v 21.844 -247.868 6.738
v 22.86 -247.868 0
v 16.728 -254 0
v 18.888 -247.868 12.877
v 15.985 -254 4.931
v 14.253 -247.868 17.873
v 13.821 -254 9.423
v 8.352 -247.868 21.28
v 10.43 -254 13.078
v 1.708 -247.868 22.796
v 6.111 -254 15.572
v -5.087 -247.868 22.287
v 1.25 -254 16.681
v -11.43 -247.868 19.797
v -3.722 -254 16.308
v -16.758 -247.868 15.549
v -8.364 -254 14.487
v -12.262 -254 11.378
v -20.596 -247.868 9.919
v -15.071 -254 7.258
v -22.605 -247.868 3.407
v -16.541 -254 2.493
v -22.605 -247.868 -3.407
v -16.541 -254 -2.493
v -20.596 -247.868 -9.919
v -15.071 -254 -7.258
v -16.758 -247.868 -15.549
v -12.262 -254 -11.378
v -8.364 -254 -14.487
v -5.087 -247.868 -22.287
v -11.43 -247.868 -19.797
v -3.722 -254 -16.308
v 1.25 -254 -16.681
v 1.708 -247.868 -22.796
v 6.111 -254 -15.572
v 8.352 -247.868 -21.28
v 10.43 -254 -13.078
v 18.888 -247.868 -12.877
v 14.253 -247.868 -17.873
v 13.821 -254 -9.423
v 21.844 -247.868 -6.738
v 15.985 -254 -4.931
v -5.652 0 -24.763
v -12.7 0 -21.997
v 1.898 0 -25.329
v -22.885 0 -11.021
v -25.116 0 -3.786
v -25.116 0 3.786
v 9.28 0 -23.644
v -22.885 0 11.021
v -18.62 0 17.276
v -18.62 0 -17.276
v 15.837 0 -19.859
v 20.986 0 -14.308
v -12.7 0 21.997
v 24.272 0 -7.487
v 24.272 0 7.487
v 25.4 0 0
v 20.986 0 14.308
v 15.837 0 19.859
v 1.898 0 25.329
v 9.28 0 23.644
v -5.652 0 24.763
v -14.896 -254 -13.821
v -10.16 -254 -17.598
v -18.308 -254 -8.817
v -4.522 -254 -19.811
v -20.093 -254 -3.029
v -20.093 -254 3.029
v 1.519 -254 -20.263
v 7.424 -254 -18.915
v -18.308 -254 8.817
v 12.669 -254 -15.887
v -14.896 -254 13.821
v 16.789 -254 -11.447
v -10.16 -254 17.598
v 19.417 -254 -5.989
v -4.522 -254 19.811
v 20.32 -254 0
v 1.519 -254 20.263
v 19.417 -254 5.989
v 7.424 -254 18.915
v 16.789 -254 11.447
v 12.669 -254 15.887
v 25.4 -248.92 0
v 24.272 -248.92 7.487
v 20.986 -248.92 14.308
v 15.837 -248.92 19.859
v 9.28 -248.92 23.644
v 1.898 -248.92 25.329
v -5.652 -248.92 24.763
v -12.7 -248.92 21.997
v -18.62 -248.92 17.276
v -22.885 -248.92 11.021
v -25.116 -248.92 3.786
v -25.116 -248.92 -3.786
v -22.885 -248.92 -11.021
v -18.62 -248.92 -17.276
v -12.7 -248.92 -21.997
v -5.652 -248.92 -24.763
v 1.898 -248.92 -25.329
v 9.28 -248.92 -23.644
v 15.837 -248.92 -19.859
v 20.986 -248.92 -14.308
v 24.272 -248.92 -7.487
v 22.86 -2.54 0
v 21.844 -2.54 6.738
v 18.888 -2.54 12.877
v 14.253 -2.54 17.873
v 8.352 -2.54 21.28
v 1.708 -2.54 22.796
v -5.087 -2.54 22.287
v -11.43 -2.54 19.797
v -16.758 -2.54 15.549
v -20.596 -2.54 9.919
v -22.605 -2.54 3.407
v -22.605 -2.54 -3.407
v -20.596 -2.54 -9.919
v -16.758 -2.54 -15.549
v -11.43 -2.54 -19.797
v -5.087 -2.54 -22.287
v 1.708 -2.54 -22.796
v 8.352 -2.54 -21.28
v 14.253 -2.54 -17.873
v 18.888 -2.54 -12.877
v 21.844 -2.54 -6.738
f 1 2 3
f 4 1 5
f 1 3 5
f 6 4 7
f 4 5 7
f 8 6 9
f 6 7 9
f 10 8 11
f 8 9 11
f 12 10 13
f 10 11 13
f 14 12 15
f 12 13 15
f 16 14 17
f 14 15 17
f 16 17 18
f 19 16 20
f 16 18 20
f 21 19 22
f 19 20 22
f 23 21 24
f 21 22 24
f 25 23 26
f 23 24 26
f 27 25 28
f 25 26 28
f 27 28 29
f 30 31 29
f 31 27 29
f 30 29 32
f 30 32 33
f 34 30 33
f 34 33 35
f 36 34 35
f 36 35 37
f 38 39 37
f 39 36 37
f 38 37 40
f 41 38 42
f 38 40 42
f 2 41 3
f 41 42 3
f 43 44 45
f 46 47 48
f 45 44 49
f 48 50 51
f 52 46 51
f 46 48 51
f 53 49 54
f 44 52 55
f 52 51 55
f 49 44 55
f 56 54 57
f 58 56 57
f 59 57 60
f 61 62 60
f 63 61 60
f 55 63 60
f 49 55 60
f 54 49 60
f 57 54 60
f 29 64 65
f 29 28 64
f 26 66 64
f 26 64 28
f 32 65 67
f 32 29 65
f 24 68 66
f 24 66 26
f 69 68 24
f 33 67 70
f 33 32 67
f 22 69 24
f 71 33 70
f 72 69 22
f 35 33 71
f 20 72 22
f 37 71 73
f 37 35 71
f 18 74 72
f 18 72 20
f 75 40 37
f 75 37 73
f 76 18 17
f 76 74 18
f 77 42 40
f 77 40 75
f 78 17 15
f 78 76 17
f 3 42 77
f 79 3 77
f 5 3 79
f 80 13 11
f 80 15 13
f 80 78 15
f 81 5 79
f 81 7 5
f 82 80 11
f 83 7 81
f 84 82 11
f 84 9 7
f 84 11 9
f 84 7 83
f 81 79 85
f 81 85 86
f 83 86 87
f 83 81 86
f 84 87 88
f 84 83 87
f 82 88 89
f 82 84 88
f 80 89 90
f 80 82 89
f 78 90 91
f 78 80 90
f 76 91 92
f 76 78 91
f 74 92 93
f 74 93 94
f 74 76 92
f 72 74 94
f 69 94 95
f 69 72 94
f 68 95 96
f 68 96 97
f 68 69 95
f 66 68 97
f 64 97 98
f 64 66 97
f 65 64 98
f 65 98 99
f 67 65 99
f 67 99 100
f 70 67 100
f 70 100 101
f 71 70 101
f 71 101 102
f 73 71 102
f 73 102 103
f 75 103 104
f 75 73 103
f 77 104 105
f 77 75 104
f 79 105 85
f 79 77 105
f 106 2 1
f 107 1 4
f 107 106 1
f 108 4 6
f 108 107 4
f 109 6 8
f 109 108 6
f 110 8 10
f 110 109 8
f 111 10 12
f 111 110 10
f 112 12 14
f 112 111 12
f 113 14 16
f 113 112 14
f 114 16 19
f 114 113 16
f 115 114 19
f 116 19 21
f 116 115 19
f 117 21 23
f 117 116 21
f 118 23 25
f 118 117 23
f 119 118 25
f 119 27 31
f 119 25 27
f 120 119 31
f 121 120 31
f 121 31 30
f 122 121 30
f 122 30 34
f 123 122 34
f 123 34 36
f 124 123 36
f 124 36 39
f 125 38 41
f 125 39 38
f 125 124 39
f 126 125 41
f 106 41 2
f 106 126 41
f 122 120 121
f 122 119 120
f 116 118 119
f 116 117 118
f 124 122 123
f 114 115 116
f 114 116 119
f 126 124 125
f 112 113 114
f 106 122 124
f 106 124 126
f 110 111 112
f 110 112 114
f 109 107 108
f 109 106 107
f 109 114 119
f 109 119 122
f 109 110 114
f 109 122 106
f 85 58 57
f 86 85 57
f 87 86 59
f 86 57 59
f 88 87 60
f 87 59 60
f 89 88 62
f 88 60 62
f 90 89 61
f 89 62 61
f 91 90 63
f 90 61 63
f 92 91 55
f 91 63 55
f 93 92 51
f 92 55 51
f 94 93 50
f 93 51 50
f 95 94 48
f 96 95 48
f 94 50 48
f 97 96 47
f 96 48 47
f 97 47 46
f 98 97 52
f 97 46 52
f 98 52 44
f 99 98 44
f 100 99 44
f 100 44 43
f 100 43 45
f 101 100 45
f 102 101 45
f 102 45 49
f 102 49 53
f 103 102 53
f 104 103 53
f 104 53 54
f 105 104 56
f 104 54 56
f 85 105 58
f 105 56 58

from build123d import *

# Parameters (mm, degrees)
F0_R     = 25.4
F1_DEPTH = 254
F2_SIZE  = 5.08
F3_T     = -2.54


with BuildPart() as f1:
    # F0 (on Front) → F1 (new body)
    with BuildSketch(Plane.XZ):
        Circle(F0_R)
    extrude(amount=F1_DEPTH)

    # F2
    f2_edges = [f1.edges().sort_by_distance(p)[0] for p in [
        (-25.4, -254, 0),
    ]]
    chamfer(f2_edges, length=F2_SIZE)

    # F3
    f3_openings = [f1.faces().sort_by_distance(p)[0] for p in [
        (0, -254, 0),
    ]]
    offset(amount=F3_T, openings=f3_openings)


solid = f1.part
